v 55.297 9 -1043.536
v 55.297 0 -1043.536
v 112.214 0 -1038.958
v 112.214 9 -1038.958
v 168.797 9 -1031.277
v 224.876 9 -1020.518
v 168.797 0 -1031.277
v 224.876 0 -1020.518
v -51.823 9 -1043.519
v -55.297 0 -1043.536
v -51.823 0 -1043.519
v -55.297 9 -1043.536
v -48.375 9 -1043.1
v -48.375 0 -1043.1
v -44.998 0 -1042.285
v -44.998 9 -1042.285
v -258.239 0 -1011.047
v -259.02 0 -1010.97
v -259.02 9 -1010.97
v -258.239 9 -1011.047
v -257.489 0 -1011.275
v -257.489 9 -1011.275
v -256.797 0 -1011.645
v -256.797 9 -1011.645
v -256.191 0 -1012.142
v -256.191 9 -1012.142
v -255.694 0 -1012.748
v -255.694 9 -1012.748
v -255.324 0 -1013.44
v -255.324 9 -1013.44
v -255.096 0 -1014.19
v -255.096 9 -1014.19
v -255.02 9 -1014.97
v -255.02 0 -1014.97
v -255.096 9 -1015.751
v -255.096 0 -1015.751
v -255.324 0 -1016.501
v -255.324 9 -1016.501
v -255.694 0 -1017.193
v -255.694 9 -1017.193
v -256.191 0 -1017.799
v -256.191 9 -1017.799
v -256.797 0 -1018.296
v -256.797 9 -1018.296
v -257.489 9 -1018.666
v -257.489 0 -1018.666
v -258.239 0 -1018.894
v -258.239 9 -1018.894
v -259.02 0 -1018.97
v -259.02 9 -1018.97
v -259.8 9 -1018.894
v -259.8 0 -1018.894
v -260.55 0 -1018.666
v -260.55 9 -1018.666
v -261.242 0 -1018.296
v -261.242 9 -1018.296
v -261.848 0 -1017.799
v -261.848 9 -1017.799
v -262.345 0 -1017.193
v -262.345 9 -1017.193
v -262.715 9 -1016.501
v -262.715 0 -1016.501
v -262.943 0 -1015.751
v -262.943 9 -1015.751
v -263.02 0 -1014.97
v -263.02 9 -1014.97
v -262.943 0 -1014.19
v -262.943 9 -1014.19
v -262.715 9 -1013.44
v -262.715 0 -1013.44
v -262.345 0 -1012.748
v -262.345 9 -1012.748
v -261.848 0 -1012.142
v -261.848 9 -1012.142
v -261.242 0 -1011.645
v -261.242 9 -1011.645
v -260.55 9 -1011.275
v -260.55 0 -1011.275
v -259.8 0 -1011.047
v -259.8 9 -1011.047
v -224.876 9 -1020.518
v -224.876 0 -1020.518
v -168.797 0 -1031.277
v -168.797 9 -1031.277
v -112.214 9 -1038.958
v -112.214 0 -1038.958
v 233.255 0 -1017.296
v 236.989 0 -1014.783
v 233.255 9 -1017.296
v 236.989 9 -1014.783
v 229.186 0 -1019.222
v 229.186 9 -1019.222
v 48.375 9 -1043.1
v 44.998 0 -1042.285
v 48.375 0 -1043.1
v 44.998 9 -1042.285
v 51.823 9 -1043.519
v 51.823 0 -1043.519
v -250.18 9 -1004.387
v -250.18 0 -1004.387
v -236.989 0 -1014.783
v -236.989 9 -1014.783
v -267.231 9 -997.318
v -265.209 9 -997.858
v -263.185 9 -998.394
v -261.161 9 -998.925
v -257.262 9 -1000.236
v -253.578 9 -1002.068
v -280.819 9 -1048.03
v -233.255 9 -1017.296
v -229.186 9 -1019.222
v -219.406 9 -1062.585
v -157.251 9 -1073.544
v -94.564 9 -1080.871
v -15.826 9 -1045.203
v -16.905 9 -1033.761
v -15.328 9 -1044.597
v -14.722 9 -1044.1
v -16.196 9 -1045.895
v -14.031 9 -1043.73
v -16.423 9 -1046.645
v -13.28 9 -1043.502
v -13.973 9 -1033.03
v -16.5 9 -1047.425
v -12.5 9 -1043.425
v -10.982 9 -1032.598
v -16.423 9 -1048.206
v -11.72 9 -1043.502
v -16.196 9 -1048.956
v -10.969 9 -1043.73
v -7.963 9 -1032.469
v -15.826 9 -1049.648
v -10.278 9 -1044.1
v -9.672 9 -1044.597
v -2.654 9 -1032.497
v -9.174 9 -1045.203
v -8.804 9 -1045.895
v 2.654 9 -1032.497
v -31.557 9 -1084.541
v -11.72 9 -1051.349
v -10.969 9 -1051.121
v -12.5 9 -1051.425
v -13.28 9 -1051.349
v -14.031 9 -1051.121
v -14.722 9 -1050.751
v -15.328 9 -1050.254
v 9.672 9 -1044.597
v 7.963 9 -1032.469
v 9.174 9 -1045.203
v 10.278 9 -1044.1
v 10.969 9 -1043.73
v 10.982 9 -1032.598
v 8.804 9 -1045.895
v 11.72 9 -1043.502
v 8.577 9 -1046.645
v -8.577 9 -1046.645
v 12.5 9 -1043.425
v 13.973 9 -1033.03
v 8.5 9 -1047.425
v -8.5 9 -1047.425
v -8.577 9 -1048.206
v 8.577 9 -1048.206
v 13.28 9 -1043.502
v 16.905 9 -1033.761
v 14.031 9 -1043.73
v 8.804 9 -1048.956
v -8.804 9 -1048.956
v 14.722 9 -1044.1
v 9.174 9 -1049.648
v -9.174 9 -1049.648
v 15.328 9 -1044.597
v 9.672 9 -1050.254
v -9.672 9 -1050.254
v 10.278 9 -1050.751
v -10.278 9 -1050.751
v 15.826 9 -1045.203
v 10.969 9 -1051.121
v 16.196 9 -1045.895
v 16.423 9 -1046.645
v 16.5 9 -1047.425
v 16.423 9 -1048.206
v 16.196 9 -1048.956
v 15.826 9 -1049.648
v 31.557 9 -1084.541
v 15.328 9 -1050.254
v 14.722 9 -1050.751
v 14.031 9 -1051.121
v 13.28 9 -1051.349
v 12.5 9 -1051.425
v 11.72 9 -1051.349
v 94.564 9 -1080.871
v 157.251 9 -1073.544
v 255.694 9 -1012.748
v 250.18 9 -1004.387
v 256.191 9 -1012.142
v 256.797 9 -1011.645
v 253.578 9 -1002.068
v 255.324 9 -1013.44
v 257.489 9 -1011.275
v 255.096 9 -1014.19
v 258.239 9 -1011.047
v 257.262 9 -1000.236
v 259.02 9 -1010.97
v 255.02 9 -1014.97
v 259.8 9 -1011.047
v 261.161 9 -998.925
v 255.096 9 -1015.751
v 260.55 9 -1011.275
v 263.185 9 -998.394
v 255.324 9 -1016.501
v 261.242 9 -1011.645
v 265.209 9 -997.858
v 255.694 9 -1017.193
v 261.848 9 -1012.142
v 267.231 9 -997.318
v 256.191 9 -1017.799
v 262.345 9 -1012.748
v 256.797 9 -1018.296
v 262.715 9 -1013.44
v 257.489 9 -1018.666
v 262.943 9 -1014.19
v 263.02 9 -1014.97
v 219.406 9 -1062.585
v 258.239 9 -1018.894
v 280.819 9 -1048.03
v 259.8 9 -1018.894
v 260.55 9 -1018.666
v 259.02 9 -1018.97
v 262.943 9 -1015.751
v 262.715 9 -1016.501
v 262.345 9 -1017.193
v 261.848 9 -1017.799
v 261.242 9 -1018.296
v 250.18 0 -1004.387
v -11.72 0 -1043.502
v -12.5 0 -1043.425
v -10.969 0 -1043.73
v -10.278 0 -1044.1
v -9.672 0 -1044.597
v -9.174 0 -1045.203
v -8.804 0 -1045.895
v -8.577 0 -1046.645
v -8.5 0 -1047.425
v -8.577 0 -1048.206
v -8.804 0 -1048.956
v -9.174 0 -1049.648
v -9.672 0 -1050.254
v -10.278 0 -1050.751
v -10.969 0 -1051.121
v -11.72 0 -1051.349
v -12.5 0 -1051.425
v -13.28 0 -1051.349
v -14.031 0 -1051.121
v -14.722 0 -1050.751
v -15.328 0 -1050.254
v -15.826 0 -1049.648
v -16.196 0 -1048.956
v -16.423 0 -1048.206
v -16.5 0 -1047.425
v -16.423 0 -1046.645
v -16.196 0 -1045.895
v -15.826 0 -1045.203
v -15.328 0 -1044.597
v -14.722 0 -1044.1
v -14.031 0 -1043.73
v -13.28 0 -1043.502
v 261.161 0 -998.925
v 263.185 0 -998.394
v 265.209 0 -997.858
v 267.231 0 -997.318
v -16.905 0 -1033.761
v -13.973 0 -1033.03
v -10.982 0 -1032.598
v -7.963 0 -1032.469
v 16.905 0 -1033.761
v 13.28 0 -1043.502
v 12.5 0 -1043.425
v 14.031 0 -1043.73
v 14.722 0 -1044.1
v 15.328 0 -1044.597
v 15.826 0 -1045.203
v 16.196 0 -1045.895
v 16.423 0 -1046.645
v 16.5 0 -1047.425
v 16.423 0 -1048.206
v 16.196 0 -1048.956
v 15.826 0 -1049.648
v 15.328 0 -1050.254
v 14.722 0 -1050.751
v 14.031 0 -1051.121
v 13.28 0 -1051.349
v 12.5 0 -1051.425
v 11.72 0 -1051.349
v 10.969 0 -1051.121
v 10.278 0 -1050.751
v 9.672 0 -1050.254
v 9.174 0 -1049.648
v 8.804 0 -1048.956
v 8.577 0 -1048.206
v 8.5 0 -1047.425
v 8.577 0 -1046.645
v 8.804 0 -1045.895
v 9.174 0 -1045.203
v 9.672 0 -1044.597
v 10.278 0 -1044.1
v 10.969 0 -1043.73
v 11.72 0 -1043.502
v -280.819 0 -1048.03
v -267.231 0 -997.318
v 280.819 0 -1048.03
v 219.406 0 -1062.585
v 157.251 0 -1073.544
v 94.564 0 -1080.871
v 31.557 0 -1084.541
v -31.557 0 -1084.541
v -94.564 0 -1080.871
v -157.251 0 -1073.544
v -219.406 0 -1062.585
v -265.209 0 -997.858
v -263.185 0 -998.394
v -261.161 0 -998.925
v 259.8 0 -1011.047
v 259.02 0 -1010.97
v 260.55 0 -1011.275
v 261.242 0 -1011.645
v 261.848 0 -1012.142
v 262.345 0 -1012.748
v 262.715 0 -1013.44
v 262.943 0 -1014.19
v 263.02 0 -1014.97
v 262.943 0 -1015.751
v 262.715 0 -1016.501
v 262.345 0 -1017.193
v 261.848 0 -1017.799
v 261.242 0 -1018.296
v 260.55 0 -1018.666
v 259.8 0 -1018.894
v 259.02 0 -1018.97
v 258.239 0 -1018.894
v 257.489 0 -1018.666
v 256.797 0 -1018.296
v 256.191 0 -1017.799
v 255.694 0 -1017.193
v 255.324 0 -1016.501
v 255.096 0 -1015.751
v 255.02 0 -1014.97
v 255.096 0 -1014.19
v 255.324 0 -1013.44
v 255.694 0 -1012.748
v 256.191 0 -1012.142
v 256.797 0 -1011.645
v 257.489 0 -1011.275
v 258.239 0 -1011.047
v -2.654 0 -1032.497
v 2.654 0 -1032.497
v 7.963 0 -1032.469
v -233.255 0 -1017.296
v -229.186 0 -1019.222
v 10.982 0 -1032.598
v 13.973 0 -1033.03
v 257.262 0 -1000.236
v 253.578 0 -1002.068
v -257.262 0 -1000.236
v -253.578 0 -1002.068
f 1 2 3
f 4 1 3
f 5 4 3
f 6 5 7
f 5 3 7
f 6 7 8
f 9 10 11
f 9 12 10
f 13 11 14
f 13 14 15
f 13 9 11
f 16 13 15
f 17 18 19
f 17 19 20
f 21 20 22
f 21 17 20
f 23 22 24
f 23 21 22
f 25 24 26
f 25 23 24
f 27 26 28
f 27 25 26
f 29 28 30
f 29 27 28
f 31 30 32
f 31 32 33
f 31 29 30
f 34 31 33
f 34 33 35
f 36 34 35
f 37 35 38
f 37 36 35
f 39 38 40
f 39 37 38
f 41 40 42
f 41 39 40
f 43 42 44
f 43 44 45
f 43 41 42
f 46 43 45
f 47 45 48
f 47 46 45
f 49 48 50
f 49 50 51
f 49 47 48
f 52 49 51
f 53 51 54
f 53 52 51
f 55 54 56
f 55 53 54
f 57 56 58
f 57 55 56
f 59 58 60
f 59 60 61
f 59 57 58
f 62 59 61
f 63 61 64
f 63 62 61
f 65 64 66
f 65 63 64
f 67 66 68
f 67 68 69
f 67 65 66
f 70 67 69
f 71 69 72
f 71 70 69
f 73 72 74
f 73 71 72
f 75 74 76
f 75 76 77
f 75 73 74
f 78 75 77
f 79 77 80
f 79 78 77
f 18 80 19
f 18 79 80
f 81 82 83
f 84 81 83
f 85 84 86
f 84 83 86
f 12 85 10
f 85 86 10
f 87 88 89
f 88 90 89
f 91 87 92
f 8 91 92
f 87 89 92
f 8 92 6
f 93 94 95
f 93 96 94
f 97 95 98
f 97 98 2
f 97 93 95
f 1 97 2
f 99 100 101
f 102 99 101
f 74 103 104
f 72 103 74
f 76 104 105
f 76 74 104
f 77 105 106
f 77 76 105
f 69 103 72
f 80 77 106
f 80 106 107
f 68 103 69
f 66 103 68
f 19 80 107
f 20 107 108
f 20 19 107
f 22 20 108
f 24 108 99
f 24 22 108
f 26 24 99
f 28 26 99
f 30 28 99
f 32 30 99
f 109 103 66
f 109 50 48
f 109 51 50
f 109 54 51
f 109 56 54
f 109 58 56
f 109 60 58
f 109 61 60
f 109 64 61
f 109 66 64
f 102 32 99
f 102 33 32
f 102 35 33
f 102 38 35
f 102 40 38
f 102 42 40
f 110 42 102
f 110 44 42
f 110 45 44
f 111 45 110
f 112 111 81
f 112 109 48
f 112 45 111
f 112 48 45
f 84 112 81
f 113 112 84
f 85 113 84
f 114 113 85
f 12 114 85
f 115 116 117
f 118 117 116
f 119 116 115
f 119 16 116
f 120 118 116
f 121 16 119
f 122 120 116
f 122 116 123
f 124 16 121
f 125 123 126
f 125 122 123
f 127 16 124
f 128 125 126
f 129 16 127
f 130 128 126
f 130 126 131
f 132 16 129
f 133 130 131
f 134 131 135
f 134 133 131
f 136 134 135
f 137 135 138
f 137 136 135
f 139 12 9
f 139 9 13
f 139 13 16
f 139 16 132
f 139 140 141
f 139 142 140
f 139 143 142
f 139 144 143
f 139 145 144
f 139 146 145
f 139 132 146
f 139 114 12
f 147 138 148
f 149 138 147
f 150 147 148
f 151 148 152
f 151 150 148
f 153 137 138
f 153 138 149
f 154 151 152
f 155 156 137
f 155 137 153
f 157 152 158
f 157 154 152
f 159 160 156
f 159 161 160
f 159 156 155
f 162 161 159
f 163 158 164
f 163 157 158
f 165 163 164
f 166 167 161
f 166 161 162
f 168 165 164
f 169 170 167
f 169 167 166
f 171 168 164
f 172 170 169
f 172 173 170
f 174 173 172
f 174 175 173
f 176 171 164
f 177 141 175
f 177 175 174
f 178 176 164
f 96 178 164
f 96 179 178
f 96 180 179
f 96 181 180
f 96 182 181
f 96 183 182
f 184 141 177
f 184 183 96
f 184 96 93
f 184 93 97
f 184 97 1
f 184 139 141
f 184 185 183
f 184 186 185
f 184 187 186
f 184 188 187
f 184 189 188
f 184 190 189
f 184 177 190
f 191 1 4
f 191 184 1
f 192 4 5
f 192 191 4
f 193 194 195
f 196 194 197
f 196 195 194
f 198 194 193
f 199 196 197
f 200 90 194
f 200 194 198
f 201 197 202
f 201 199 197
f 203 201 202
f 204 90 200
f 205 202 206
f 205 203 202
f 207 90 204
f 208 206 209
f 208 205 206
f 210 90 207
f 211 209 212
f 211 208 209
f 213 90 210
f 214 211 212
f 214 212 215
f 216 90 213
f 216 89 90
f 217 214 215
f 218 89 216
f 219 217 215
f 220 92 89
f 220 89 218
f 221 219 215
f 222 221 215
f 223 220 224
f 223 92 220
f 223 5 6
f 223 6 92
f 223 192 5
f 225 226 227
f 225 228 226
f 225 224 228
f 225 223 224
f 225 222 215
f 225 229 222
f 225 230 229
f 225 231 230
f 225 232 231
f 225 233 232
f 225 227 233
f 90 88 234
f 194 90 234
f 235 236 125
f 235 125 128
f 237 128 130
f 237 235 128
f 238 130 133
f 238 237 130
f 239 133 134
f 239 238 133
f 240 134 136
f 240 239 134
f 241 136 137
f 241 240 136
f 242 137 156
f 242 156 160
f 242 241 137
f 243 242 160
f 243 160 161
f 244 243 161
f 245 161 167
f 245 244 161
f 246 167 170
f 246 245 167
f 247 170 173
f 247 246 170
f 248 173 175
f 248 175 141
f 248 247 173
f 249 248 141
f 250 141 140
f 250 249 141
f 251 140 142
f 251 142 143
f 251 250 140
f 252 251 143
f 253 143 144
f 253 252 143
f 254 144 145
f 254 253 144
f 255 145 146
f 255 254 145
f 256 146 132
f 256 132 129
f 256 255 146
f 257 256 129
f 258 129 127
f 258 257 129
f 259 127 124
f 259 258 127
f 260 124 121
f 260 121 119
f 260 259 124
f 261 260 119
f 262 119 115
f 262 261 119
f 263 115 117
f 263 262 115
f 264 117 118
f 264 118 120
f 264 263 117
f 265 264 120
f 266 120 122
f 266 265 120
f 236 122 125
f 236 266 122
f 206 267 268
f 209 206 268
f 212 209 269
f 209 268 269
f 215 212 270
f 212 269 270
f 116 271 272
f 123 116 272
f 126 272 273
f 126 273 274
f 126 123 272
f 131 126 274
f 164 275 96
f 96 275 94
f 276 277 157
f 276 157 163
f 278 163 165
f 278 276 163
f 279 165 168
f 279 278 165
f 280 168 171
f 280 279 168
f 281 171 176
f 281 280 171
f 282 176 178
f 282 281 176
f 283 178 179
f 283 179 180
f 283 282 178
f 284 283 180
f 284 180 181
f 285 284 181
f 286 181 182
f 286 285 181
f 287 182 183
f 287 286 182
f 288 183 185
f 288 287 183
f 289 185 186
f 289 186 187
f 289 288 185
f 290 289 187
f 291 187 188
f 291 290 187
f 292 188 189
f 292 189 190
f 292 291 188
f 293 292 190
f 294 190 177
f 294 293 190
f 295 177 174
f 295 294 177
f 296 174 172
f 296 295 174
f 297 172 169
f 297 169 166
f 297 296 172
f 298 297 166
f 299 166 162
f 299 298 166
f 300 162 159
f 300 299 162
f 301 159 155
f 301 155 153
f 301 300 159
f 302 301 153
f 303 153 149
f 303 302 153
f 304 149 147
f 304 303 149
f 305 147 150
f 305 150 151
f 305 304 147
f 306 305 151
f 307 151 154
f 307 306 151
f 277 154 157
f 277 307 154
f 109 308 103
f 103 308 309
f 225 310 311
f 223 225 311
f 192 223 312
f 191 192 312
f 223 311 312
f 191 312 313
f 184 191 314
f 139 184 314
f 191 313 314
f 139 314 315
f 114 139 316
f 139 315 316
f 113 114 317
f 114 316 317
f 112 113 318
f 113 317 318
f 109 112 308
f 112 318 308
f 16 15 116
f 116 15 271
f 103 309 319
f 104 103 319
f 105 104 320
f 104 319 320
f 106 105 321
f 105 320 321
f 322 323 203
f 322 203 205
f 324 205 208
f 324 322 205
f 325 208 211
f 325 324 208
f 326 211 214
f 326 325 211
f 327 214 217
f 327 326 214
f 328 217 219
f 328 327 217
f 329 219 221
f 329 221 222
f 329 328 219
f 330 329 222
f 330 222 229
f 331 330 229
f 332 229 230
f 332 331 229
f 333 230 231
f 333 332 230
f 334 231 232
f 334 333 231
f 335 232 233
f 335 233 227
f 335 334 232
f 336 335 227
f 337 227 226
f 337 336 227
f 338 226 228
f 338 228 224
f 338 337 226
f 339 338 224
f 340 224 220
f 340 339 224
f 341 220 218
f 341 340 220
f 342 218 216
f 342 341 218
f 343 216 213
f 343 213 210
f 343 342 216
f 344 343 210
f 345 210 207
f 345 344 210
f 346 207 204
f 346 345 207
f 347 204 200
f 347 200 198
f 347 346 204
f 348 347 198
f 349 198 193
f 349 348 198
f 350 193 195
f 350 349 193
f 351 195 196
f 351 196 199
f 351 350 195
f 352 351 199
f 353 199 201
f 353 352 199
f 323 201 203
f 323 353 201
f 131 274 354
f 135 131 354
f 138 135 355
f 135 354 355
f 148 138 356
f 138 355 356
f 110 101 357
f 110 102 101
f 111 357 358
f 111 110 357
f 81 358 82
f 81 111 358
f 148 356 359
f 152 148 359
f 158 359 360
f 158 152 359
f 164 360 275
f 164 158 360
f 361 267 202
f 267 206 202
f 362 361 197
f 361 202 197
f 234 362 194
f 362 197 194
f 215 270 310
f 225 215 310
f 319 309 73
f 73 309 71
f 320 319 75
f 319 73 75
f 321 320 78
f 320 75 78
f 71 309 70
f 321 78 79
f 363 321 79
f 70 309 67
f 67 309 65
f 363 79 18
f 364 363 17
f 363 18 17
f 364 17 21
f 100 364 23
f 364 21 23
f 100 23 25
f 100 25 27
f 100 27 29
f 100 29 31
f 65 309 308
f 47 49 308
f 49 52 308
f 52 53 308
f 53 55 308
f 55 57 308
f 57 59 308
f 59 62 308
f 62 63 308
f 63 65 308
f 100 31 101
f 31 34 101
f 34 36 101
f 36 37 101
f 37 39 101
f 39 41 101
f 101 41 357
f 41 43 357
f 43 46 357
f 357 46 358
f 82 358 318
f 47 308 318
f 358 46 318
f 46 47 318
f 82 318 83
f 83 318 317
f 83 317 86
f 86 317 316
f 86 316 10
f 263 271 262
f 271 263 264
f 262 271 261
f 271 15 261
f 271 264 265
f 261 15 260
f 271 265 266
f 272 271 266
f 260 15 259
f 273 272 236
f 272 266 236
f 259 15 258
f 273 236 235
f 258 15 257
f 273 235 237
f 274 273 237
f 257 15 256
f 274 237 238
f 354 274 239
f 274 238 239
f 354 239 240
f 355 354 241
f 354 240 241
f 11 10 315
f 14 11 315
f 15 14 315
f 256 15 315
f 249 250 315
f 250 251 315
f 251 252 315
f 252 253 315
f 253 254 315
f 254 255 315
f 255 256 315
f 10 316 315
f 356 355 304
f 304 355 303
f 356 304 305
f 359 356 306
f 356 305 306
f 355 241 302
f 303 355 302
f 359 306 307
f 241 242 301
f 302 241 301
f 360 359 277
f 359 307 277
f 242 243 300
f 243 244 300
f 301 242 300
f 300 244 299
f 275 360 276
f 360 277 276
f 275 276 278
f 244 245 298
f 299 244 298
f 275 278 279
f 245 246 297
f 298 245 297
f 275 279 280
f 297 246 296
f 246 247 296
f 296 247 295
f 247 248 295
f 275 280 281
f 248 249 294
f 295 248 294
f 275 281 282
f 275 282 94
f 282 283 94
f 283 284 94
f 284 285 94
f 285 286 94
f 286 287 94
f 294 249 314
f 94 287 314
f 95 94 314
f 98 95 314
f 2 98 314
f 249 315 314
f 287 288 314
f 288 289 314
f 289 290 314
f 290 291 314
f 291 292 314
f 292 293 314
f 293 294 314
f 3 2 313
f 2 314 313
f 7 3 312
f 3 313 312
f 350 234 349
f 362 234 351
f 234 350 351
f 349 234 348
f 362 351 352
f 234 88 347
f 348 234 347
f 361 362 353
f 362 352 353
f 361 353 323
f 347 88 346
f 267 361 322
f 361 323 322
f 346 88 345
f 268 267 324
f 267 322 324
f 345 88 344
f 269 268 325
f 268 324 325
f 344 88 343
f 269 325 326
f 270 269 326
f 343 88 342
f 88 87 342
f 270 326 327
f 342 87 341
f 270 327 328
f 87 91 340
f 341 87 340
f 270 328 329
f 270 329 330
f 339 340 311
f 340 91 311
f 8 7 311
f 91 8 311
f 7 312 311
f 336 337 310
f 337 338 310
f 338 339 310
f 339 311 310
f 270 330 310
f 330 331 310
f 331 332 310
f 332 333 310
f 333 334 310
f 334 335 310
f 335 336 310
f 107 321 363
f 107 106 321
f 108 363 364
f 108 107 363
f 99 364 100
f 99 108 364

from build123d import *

# Parameters (mm, degrees)
SKETCH1_R           = 4
BOSS_EXTRUDE1_DEPTH = 9
FILLET1_R           = 30


with BuildPart() as part:
    # Sketch1 → Boss-Extrude1 (new body)
    with BuildSketch(Plane(origin=(0, 0, 0), x_dir=(1, 0, 0), z_dir=(0, 1, 0))):
        with BuildLine():
            ThreePointArc((-267.230664068, 997.318415643), (-261.188620877, 998.917791575), (-255.137006757, 1000.480563421))
            Line((-255.137006757, 1000.480563421), (-231.630657469, 1019.00551447))
            ThreePointArc((-231.630657469, 1019.00551447), (-141.360133679, 1035.394761724), (-50, 1043.80314236))
            Line((-50, 1043.80314236), (-12.5, 1032.424331368))
            ThreePointArc((-12.5, 1032.424331368), (0, 1032.5), (12.5, 1032.424331368))
            Line((12.5, 1032.424331368), (50, 1043.80314236))
            ThreePointArc((50, 1043.80314236), (141.360133679, 1035.394761724), (231.630657469, 1019.00551447))
            Line((231.630657469, 1019.00551447), (255.137006757, 1000.480563421))
            ThreePointArc((255.137006757, 1000.480563421), (261.188620877, 998.917791575), (267.230664068, 997.318415643))
            Line((267.230664068, 997.318415643), (280.818663936, 1048.029521524))
            ThreePointArc((280.818663936, 1048.029521524), (0, 1085), (-280.818663936, 1048.029521524))
            Line((-280.818663936, 1048.029521524), (-267.230664068, 997.318415643))
        make_face()
        with Locations(Location((-12.5, 1047.425415006, 0), (0, 0, 270))):
            Circle(SKETCH1_R, mode=Mode.SUBTRACT)
        with Locations(Location((12.5, 1047.425415006, 0), (0, 0, 270))):
            Circle(SKETCH1_R, mode=Mode.SUBTRACT)
        with Locations(Location((-259.019572899, 1014.970497529, 0), (0, 0, 270))):
            Circle(SKETCH1_R, mode=Mode.SUBTRACT)
        with Locations(Location((259.019572899, 1014.970497529, 0), (0, 0, 270))):
            Circle(SKETCH1_R, mode=Mode.SUBTRACT)
    extrude(amount=BOSS_EXTRUDE1_DEPTH)

    # Fillet1
    fillet1_edges = [part.edges().sort_by_distance(p)[0] for p in [
        (50, 4.5, -1043.80314236),
        (12.5, 4.5, -1032.424331368),
        (-12.5, 4.5, -1032.424331368),
        (-50, 4.5, -1043.80314236),
        (-231.630657469, 4.5, -1019.00551447),
        (-255.137006757, 4.5, -1000.480563421),
        (255.137006757, 4.5, -1000.480563421),
        (231.630657469, 4.5, -1019.00551447),
    ]]
    fillet(fillet1_edges, radius=FILLET1_R)


solid = part.part
